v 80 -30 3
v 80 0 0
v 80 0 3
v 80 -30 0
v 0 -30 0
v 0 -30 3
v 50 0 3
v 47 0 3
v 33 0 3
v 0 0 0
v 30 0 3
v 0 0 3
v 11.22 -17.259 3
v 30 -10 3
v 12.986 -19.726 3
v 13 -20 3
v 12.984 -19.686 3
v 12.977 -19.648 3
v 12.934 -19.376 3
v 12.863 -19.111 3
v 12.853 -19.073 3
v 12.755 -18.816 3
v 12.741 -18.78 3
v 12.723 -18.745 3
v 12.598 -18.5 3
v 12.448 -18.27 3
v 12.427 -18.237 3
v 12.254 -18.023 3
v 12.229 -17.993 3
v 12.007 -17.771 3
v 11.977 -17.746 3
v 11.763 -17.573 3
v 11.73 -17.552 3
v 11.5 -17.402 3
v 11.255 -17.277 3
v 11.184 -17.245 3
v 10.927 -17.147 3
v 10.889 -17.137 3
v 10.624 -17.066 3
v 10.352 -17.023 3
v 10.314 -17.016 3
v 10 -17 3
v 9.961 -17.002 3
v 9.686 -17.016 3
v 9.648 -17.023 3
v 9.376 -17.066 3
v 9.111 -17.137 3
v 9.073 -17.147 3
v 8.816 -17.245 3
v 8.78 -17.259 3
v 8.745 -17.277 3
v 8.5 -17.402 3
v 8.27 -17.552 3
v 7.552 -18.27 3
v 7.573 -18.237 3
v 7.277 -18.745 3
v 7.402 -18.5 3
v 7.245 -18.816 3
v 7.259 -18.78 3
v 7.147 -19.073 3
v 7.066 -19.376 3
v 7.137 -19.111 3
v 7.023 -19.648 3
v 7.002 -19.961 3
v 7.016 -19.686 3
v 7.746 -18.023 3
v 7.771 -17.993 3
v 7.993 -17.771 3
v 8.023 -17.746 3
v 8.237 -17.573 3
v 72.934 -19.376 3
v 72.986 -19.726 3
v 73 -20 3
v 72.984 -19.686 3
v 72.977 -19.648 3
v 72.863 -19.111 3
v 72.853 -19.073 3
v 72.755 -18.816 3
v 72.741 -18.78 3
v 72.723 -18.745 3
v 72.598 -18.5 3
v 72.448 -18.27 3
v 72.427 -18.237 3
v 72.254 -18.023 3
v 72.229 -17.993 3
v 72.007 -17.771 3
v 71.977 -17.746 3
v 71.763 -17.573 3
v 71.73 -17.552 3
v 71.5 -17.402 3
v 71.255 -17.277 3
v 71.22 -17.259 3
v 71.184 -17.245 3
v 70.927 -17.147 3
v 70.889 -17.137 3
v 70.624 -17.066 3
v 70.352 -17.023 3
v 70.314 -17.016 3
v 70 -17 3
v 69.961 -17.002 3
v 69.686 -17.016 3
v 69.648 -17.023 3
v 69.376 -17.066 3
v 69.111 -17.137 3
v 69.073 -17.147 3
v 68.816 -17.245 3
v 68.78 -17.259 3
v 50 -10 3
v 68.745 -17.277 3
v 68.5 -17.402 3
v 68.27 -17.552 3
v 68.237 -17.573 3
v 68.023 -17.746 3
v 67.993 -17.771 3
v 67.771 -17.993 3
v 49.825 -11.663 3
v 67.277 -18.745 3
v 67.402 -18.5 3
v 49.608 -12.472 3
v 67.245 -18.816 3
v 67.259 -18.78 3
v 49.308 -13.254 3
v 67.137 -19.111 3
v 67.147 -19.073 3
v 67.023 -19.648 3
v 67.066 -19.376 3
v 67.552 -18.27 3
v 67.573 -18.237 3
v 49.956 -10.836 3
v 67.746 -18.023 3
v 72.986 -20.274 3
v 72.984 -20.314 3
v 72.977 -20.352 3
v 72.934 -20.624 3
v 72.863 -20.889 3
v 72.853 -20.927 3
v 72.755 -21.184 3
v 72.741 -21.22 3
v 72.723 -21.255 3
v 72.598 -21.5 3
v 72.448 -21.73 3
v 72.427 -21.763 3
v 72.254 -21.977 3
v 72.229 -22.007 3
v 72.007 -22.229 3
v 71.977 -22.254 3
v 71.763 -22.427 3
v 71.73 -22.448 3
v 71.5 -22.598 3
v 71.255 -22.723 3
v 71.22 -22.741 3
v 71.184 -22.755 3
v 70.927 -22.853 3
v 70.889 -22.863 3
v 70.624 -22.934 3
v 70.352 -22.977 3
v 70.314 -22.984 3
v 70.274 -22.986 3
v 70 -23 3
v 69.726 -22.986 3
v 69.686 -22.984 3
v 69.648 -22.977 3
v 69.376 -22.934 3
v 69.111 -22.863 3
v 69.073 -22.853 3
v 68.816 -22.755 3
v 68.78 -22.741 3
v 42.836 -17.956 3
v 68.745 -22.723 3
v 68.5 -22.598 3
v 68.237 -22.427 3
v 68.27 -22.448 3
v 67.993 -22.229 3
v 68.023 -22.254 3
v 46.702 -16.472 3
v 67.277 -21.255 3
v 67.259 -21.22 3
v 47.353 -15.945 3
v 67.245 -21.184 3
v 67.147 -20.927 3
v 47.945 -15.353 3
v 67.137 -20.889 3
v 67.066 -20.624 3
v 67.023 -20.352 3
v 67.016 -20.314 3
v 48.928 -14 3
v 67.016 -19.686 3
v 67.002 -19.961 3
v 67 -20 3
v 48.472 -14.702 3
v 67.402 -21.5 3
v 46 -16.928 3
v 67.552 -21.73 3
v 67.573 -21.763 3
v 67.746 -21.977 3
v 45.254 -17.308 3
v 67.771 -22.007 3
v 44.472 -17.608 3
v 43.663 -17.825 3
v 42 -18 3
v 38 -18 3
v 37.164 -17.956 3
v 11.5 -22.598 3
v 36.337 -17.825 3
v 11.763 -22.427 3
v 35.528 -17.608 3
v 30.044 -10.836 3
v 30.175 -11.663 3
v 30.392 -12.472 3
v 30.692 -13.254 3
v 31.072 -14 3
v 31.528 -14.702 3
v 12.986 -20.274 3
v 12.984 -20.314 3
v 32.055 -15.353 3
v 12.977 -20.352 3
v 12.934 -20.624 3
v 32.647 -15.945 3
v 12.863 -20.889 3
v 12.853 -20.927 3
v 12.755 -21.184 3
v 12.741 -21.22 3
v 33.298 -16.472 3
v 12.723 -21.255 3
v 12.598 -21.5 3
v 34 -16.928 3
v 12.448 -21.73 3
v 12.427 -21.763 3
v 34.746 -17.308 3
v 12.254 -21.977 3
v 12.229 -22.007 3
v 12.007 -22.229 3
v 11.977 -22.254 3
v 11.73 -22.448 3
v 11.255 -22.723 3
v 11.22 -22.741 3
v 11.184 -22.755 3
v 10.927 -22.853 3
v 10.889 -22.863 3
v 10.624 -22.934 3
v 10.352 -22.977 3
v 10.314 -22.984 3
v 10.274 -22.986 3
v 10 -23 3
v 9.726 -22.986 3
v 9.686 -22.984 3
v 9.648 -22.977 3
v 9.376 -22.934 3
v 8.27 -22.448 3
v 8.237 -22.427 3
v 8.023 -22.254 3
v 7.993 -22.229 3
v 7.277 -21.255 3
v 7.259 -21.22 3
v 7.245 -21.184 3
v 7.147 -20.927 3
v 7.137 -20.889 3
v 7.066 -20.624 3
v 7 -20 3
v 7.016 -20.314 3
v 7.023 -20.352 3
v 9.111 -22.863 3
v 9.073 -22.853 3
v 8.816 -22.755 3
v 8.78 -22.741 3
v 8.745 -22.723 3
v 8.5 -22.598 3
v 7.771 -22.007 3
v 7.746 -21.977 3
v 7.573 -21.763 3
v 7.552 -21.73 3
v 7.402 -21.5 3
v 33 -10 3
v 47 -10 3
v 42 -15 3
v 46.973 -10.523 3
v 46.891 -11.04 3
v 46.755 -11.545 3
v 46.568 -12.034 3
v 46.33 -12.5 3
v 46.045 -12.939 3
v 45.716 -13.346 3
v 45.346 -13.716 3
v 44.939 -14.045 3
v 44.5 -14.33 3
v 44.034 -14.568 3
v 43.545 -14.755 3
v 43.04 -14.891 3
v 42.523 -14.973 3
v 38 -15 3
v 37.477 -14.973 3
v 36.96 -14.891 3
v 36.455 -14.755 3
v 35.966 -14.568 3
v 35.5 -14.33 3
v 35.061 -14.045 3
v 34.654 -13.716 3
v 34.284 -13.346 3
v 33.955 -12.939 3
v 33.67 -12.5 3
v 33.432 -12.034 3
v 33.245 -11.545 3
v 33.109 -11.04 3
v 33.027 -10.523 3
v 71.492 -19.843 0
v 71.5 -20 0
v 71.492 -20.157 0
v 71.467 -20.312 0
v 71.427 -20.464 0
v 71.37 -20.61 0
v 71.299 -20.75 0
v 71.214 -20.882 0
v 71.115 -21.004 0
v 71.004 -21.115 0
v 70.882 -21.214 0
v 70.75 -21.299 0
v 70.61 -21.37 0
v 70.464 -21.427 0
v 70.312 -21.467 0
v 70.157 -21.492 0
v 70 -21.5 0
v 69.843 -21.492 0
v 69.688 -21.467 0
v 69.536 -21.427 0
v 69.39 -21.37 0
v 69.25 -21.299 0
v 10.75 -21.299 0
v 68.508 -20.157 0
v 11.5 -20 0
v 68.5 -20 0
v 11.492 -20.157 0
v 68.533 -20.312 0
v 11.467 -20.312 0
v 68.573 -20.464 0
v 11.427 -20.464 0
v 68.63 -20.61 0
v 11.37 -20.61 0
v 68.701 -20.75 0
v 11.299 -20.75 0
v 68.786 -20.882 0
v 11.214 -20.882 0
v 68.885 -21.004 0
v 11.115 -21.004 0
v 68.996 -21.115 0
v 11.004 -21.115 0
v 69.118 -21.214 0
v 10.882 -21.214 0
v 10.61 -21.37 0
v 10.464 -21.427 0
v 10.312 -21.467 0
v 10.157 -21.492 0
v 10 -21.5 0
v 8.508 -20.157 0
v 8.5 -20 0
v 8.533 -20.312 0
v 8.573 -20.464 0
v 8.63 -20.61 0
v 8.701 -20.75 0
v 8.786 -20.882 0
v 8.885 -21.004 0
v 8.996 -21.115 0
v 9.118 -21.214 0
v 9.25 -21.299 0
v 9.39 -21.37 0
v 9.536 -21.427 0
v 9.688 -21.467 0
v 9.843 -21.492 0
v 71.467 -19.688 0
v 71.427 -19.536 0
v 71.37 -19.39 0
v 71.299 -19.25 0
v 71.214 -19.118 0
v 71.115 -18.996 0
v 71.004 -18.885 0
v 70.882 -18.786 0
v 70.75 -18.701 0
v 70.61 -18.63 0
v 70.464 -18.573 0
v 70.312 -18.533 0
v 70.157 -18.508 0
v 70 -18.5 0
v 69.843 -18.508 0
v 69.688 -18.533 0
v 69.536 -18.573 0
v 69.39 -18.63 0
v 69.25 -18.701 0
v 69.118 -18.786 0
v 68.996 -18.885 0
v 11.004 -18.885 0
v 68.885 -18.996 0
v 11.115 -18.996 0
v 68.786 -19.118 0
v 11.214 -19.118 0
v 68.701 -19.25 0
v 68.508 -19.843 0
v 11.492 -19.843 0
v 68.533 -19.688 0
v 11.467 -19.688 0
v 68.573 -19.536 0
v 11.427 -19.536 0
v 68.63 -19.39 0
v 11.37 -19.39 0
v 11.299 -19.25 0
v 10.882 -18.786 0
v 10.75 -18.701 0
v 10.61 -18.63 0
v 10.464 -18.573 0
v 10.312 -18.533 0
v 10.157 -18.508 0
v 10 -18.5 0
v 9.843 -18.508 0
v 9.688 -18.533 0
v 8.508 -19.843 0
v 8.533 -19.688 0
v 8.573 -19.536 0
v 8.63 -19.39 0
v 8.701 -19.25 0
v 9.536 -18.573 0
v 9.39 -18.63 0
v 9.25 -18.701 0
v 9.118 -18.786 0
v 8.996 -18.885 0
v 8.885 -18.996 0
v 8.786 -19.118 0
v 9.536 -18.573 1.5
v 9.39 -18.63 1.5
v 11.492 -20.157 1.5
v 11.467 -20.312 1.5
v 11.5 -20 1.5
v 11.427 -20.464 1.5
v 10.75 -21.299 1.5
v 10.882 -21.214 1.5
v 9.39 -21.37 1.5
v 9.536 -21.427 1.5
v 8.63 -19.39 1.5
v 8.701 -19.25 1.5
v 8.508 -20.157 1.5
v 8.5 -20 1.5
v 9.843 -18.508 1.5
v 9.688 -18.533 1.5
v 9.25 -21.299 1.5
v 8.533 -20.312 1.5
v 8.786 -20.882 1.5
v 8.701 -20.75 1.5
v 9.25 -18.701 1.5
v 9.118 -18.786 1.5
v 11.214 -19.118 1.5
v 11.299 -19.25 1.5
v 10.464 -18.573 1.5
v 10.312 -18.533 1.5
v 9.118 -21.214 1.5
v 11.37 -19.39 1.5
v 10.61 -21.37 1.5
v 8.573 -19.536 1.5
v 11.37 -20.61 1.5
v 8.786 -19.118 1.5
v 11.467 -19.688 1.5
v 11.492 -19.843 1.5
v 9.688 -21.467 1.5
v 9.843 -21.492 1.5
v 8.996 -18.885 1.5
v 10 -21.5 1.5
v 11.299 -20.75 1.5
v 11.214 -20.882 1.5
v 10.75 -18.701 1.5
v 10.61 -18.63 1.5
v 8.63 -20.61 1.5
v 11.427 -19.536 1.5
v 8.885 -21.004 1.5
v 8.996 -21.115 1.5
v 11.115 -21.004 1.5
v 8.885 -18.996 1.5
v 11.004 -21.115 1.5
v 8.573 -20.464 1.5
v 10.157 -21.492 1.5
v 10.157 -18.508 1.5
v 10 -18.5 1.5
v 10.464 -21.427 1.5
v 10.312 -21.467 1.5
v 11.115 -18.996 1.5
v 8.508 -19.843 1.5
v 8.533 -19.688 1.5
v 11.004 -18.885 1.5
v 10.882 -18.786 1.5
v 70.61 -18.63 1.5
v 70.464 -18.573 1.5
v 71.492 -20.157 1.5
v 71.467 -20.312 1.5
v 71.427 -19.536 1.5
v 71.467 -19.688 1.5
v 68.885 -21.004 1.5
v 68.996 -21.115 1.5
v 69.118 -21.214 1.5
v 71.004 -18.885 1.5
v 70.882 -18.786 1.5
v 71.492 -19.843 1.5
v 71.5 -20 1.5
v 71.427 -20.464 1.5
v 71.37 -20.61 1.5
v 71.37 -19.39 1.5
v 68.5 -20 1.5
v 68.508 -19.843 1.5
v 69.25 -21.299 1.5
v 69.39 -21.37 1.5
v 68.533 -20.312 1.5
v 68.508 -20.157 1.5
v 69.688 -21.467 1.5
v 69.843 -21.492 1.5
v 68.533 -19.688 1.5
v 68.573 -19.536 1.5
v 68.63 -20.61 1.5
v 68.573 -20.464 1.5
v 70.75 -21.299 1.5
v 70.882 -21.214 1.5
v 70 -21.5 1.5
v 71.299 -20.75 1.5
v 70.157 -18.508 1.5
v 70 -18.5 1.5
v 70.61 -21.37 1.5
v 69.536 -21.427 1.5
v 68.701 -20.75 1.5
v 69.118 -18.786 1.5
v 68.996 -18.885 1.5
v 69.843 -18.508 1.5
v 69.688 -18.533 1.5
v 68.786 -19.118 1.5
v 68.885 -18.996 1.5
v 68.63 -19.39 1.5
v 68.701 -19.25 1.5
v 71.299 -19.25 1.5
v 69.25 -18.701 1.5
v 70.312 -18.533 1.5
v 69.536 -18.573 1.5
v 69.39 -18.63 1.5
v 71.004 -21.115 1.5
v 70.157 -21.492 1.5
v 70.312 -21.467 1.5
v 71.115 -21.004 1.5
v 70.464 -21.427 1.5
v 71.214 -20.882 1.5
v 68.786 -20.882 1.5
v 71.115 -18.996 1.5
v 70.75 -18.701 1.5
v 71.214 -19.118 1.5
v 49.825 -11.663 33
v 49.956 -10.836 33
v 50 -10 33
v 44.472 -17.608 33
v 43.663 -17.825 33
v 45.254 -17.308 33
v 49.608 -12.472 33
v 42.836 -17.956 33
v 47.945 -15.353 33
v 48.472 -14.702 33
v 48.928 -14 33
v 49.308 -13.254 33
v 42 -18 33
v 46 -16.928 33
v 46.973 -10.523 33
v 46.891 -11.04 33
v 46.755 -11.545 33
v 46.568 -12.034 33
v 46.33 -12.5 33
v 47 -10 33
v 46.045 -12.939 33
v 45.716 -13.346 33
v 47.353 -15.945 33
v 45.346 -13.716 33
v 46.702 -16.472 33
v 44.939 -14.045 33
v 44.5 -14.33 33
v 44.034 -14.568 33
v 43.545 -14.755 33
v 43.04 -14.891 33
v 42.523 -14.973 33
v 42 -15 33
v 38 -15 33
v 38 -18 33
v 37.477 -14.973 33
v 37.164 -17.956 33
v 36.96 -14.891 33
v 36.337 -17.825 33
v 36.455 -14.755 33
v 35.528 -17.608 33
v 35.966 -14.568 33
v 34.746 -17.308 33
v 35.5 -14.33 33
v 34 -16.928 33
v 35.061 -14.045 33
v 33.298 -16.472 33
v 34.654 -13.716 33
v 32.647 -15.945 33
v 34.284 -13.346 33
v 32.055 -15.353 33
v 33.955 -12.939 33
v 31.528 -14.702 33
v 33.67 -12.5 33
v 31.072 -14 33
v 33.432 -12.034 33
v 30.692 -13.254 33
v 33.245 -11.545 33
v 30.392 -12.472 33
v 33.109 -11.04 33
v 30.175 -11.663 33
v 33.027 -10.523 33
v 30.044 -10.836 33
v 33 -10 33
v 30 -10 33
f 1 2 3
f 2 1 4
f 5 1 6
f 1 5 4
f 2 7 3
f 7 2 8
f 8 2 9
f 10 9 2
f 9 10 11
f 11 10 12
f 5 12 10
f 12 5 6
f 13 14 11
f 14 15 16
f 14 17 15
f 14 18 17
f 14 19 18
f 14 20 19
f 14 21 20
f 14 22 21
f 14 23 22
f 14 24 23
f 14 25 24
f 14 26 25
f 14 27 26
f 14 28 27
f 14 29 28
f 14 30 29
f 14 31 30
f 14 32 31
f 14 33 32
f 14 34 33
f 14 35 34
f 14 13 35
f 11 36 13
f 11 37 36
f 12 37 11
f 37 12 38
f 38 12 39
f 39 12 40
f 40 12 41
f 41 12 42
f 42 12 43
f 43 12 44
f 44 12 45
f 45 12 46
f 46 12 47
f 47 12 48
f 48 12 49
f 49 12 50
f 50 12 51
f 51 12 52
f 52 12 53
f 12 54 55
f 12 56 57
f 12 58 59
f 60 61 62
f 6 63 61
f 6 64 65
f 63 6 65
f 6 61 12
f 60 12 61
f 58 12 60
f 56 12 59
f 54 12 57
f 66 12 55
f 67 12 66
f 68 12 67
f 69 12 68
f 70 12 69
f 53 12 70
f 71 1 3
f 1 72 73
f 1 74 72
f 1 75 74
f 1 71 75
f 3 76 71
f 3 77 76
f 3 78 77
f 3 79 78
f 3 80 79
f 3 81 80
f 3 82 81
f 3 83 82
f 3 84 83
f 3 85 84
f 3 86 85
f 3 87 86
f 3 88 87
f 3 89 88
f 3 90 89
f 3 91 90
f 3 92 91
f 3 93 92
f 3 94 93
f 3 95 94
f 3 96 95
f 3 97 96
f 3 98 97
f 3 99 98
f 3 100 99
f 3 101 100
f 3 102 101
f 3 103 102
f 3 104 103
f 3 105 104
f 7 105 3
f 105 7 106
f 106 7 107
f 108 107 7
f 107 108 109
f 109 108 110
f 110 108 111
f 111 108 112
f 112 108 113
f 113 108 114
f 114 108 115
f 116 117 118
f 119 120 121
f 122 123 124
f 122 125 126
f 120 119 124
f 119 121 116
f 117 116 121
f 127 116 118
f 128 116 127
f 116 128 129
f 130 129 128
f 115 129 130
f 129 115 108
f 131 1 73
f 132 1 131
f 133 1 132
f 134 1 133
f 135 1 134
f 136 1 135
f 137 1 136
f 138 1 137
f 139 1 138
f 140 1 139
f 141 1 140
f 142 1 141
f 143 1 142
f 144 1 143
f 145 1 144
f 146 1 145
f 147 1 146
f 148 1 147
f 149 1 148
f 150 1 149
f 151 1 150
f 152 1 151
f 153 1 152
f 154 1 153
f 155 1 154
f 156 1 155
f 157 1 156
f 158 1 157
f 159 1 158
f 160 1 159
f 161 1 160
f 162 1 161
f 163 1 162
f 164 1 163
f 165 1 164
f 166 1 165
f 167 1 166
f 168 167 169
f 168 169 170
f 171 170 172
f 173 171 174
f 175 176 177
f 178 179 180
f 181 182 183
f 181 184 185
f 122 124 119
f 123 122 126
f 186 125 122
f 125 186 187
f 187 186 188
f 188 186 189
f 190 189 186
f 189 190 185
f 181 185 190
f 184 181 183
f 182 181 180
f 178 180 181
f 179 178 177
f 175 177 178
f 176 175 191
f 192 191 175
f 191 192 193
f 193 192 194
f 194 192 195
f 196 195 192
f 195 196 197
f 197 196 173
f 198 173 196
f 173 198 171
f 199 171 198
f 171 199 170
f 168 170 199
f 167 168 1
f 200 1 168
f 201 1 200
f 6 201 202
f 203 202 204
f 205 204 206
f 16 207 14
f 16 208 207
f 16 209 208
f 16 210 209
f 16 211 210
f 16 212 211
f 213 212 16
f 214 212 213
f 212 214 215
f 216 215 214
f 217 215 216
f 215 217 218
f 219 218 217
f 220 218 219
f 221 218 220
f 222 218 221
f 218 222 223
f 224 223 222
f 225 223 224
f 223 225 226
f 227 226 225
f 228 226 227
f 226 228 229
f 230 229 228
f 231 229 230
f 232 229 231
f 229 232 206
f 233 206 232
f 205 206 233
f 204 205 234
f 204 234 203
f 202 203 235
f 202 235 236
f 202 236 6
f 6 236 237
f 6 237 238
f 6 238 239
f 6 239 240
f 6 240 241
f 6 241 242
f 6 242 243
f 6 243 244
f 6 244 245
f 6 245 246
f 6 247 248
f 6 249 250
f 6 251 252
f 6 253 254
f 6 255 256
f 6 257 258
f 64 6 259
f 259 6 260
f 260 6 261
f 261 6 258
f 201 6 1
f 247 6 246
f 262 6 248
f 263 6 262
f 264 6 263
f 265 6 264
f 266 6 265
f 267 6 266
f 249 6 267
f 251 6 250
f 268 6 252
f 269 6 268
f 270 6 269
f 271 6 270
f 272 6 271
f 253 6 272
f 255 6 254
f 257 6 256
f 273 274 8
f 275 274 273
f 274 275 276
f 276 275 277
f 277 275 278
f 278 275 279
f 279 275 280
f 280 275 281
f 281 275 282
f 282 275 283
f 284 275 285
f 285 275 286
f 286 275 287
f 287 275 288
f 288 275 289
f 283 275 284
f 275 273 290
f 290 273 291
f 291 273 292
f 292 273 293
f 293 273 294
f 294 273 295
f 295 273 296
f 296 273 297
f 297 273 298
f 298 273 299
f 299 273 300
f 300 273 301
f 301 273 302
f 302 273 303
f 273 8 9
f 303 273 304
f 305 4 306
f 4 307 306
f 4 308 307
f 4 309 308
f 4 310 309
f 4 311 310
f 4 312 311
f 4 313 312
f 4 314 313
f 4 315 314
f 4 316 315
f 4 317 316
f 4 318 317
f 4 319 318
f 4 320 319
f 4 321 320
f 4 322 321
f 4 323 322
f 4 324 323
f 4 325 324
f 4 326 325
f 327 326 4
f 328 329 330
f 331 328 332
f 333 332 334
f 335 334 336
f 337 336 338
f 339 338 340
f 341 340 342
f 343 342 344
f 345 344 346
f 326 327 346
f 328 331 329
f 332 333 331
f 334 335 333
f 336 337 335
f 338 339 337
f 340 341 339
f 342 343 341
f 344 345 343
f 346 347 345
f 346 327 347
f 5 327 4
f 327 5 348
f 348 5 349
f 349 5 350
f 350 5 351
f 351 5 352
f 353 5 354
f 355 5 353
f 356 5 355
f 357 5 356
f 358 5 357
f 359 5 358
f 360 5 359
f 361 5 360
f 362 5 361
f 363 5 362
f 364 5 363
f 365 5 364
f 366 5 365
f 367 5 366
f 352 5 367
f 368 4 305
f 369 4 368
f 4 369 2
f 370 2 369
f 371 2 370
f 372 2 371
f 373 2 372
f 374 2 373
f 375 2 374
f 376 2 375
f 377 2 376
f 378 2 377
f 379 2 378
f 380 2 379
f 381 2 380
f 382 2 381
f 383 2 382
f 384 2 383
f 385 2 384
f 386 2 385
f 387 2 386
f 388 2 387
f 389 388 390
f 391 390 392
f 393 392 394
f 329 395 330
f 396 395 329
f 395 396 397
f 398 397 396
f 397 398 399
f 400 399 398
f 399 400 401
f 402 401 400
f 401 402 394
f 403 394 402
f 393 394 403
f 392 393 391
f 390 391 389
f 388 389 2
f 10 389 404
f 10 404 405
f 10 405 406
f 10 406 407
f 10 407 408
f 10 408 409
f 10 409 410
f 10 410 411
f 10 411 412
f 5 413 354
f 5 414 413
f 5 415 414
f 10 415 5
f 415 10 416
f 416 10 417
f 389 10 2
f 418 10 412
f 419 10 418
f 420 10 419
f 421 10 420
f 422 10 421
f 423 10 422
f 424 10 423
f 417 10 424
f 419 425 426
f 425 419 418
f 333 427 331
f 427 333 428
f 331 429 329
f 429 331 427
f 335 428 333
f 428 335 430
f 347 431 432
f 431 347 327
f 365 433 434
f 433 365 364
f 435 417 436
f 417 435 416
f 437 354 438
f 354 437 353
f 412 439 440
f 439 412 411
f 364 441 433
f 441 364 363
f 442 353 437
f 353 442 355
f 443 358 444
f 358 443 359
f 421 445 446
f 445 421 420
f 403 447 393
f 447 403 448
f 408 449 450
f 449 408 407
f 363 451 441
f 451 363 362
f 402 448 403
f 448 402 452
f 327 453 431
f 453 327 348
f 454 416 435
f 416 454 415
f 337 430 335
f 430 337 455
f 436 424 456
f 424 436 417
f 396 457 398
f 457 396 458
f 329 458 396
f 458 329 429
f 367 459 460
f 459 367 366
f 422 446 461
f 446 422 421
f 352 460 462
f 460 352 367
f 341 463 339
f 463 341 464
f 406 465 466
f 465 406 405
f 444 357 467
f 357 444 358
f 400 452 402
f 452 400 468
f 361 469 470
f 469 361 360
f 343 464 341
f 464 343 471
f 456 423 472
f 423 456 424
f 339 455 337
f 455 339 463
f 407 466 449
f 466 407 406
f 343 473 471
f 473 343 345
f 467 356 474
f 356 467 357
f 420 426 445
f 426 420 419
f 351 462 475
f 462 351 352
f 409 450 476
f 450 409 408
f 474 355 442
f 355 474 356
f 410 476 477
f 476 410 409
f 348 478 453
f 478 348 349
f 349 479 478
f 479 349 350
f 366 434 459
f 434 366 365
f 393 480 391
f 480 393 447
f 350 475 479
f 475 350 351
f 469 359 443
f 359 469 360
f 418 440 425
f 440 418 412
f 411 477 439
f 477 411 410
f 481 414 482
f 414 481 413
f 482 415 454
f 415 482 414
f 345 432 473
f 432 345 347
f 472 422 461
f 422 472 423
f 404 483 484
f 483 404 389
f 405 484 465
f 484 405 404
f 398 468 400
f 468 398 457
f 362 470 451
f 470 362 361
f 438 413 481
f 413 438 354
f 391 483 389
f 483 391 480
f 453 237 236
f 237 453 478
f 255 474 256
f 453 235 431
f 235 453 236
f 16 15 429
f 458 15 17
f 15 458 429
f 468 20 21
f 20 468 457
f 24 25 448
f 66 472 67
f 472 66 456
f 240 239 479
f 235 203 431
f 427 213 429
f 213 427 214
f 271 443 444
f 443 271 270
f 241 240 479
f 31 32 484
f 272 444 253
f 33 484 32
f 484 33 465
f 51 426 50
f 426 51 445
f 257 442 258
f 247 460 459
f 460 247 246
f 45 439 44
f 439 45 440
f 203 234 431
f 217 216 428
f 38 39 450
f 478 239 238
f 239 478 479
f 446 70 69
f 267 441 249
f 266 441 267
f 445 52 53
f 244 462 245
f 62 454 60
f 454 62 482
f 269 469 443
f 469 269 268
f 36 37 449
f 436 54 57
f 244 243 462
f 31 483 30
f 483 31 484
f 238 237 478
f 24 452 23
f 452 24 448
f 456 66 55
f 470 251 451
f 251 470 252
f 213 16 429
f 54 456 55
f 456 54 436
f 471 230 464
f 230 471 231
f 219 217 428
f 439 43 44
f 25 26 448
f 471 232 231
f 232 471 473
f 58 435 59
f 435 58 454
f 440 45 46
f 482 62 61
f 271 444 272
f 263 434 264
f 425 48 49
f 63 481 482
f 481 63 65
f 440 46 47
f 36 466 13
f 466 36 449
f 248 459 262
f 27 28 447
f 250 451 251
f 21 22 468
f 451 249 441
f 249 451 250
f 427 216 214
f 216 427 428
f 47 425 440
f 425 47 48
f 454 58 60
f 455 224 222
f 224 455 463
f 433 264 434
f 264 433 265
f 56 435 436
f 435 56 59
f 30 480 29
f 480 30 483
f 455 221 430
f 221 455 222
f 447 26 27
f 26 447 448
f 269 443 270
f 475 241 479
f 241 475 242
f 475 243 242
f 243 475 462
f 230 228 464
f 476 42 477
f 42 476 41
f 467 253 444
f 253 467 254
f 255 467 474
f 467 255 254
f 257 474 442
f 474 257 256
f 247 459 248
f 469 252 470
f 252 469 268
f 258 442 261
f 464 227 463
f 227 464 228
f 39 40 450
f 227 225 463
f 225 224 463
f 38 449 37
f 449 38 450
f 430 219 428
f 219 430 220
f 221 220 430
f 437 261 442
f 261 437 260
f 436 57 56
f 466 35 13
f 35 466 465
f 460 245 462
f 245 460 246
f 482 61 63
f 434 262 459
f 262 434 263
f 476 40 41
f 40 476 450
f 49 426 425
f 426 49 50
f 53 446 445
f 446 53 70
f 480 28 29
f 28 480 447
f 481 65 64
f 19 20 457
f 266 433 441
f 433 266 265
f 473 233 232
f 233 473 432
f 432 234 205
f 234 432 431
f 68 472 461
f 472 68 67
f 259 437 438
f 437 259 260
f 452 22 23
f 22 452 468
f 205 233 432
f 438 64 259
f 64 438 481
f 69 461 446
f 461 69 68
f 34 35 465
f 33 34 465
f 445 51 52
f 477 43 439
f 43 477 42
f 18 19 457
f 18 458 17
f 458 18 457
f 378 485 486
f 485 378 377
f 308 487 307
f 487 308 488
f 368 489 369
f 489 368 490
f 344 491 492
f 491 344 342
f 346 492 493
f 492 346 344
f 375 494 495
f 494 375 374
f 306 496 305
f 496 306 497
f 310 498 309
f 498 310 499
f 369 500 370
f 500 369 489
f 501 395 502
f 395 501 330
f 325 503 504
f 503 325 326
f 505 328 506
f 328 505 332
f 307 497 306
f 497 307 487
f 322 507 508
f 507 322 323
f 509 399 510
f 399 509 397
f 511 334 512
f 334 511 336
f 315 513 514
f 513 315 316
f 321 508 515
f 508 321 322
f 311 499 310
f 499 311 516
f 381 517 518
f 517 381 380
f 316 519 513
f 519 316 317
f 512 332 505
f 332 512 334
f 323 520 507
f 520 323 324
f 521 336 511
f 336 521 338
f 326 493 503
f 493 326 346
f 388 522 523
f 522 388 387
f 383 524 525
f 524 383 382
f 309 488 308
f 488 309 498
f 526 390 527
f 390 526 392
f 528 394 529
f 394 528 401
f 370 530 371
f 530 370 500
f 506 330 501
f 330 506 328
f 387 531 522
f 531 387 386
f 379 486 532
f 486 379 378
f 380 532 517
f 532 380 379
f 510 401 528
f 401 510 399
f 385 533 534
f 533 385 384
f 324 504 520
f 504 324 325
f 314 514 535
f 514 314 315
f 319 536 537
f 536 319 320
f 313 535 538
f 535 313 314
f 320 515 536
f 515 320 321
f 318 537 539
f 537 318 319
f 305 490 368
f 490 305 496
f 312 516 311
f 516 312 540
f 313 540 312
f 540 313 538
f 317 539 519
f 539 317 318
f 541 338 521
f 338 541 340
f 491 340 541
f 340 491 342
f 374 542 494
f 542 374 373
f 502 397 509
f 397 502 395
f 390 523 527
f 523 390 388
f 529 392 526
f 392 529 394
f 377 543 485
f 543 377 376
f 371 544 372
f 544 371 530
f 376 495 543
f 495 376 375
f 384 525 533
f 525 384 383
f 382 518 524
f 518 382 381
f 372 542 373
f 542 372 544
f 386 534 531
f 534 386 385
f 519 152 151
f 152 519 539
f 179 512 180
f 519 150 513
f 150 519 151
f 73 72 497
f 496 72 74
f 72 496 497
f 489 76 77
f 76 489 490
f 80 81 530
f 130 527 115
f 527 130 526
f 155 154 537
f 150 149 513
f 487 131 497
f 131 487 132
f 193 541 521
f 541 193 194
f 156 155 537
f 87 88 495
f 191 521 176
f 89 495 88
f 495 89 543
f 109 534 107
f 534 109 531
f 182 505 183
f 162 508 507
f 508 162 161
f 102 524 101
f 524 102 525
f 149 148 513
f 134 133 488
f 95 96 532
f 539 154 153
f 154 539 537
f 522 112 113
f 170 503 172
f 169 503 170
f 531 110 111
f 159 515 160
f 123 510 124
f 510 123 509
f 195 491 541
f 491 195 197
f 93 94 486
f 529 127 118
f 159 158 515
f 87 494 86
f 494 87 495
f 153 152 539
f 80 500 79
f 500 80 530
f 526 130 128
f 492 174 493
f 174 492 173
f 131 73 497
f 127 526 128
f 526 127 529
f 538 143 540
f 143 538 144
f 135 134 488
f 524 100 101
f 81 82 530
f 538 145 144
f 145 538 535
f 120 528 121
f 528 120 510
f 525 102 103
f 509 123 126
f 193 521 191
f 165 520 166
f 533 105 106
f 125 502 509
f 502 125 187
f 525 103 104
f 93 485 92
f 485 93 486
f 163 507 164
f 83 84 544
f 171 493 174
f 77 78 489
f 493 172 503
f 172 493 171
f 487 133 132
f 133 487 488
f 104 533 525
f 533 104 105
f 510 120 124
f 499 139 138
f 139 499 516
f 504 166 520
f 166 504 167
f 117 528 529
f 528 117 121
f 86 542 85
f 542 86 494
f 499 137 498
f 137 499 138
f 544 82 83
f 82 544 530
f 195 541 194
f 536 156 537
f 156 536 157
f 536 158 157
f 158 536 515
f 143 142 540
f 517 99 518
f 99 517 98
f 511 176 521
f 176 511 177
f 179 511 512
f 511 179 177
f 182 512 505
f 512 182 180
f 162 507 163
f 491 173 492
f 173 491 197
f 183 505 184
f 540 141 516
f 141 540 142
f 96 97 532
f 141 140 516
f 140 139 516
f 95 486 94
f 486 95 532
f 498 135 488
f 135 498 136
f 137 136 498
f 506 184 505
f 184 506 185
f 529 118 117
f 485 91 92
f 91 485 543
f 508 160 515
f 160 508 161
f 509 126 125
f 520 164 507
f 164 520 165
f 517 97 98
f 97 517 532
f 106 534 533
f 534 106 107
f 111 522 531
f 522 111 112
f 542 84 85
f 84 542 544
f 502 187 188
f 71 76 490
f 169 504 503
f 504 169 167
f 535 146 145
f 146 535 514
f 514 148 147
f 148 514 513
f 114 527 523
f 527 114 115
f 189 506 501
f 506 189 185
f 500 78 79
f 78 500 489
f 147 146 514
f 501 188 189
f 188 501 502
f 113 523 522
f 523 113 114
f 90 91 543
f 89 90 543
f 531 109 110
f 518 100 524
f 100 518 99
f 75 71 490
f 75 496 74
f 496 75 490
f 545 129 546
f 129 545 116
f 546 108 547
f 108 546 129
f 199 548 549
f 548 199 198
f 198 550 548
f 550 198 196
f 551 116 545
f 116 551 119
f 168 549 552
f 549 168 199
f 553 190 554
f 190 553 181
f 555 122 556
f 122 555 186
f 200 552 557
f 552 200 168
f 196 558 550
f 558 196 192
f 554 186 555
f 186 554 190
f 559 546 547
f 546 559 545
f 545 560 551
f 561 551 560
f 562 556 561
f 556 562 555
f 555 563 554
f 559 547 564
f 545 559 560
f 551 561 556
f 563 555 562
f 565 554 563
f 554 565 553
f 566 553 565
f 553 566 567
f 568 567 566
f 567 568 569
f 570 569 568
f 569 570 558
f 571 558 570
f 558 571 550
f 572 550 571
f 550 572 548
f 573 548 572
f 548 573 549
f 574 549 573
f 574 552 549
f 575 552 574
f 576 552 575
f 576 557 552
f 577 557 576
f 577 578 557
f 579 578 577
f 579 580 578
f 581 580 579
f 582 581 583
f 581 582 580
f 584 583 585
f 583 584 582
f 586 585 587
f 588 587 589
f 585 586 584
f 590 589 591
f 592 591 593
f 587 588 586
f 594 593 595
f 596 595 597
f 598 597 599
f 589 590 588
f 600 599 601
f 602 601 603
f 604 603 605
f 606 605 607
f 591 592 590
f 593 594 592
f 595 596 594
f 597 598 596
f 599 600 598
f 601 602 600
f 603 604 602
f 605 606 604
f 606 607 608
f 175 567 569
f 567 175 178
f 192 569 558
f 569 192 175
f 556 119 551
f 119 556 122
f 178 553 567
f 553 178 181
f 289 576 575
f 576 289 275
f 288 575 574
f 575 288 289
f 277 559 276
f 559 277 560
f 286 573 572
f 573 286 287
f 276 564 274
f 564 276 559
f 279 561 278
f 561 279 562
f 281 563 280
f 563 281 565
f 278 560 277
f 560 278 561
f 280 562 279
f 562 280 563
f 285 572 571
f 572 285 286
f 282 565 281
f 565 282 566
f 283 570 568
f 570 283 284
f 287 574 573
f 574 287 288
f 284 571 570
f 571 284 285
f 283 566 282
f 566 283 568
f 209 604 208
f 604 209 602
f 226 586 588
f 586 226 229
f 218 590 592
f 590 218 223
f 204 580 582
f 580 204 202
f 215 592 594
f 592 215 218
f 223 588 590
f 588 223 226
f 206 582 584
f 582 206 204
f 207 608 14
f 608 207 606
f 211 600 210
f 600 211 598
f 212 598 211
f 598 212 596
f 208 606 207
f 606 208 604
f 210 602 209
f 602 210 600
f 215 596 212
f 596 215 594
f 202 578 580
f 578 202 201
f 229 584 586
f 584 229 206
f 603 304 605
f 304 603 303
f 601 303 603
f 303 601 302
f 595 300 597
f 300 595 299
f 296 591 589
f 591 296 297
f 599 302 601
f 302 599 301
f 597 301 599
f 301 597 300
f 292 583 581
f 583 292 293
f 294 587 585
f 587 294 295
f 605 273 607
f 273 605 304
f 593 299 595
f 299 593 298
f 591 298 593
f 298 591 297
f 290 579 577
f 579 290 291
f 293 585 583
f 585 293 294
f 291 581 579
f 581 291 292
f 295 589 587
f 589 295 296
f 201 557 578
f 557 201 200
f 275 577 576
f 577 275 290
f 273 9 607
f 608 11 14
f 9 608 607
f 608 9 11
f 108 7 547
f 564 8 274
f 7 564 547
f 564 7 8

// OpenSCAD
$fn = 60;

rotate([90, 0, 0]) {
 difference () {
   cube([80, 3, 30]);
   translate([10, 4, 20]) rotate([90, 0, 0]) cylinder(5, r=1.5);
   translate([10, 1.5, 20]) rotate([-90, 0, 0]) cylinder(2, r1=1.5, r2=3.5);
   translate([70, 4, 20]) rotate([90, 0, 0]) cylinder(5, r=1.5);
   translate([70, 1.5, 20]) rotate([-90, 0, 0]) cylinder(2, r1=1.5, r2=3.5);
 

 
   }
 
  translate([42, 3, 10]) rotate([-90, 0, 0]) difference () { cylinder(30, r=8); 
    cylinder(31, r=5); 
    translate([-9, -9, 0]) cube([9, 18, 31]);
    translate([0, 0, 0]) cube([9, 9, 31]);

    }
  translate([38, 3, 10]) rotate([-90, 0, 0]) difference () {
    cylinder(30, r=8); 
    cylinder(31, r=5);
    translate([0, -9, 0]) cube([9, 18, 31]);
    translate([-9, 0, 0]) cube([9, 9, 31]);
  }
   
  translate([38, 3, 15]) cube([4, 30, 3]);
  
   

translate([33, 3, 0]) rotate([0, -90, 0]) {
linear_extrude(height=3) {
polygon([[0, 0], [10, 0], [10, 30]]);
}
}

translate([50, 3, 0]) rotate([0, -90, 0]) {
linear_extrude(height=3) {
polygon([[0, 0], [10, 0], [10, 30]]);
}
}

}
